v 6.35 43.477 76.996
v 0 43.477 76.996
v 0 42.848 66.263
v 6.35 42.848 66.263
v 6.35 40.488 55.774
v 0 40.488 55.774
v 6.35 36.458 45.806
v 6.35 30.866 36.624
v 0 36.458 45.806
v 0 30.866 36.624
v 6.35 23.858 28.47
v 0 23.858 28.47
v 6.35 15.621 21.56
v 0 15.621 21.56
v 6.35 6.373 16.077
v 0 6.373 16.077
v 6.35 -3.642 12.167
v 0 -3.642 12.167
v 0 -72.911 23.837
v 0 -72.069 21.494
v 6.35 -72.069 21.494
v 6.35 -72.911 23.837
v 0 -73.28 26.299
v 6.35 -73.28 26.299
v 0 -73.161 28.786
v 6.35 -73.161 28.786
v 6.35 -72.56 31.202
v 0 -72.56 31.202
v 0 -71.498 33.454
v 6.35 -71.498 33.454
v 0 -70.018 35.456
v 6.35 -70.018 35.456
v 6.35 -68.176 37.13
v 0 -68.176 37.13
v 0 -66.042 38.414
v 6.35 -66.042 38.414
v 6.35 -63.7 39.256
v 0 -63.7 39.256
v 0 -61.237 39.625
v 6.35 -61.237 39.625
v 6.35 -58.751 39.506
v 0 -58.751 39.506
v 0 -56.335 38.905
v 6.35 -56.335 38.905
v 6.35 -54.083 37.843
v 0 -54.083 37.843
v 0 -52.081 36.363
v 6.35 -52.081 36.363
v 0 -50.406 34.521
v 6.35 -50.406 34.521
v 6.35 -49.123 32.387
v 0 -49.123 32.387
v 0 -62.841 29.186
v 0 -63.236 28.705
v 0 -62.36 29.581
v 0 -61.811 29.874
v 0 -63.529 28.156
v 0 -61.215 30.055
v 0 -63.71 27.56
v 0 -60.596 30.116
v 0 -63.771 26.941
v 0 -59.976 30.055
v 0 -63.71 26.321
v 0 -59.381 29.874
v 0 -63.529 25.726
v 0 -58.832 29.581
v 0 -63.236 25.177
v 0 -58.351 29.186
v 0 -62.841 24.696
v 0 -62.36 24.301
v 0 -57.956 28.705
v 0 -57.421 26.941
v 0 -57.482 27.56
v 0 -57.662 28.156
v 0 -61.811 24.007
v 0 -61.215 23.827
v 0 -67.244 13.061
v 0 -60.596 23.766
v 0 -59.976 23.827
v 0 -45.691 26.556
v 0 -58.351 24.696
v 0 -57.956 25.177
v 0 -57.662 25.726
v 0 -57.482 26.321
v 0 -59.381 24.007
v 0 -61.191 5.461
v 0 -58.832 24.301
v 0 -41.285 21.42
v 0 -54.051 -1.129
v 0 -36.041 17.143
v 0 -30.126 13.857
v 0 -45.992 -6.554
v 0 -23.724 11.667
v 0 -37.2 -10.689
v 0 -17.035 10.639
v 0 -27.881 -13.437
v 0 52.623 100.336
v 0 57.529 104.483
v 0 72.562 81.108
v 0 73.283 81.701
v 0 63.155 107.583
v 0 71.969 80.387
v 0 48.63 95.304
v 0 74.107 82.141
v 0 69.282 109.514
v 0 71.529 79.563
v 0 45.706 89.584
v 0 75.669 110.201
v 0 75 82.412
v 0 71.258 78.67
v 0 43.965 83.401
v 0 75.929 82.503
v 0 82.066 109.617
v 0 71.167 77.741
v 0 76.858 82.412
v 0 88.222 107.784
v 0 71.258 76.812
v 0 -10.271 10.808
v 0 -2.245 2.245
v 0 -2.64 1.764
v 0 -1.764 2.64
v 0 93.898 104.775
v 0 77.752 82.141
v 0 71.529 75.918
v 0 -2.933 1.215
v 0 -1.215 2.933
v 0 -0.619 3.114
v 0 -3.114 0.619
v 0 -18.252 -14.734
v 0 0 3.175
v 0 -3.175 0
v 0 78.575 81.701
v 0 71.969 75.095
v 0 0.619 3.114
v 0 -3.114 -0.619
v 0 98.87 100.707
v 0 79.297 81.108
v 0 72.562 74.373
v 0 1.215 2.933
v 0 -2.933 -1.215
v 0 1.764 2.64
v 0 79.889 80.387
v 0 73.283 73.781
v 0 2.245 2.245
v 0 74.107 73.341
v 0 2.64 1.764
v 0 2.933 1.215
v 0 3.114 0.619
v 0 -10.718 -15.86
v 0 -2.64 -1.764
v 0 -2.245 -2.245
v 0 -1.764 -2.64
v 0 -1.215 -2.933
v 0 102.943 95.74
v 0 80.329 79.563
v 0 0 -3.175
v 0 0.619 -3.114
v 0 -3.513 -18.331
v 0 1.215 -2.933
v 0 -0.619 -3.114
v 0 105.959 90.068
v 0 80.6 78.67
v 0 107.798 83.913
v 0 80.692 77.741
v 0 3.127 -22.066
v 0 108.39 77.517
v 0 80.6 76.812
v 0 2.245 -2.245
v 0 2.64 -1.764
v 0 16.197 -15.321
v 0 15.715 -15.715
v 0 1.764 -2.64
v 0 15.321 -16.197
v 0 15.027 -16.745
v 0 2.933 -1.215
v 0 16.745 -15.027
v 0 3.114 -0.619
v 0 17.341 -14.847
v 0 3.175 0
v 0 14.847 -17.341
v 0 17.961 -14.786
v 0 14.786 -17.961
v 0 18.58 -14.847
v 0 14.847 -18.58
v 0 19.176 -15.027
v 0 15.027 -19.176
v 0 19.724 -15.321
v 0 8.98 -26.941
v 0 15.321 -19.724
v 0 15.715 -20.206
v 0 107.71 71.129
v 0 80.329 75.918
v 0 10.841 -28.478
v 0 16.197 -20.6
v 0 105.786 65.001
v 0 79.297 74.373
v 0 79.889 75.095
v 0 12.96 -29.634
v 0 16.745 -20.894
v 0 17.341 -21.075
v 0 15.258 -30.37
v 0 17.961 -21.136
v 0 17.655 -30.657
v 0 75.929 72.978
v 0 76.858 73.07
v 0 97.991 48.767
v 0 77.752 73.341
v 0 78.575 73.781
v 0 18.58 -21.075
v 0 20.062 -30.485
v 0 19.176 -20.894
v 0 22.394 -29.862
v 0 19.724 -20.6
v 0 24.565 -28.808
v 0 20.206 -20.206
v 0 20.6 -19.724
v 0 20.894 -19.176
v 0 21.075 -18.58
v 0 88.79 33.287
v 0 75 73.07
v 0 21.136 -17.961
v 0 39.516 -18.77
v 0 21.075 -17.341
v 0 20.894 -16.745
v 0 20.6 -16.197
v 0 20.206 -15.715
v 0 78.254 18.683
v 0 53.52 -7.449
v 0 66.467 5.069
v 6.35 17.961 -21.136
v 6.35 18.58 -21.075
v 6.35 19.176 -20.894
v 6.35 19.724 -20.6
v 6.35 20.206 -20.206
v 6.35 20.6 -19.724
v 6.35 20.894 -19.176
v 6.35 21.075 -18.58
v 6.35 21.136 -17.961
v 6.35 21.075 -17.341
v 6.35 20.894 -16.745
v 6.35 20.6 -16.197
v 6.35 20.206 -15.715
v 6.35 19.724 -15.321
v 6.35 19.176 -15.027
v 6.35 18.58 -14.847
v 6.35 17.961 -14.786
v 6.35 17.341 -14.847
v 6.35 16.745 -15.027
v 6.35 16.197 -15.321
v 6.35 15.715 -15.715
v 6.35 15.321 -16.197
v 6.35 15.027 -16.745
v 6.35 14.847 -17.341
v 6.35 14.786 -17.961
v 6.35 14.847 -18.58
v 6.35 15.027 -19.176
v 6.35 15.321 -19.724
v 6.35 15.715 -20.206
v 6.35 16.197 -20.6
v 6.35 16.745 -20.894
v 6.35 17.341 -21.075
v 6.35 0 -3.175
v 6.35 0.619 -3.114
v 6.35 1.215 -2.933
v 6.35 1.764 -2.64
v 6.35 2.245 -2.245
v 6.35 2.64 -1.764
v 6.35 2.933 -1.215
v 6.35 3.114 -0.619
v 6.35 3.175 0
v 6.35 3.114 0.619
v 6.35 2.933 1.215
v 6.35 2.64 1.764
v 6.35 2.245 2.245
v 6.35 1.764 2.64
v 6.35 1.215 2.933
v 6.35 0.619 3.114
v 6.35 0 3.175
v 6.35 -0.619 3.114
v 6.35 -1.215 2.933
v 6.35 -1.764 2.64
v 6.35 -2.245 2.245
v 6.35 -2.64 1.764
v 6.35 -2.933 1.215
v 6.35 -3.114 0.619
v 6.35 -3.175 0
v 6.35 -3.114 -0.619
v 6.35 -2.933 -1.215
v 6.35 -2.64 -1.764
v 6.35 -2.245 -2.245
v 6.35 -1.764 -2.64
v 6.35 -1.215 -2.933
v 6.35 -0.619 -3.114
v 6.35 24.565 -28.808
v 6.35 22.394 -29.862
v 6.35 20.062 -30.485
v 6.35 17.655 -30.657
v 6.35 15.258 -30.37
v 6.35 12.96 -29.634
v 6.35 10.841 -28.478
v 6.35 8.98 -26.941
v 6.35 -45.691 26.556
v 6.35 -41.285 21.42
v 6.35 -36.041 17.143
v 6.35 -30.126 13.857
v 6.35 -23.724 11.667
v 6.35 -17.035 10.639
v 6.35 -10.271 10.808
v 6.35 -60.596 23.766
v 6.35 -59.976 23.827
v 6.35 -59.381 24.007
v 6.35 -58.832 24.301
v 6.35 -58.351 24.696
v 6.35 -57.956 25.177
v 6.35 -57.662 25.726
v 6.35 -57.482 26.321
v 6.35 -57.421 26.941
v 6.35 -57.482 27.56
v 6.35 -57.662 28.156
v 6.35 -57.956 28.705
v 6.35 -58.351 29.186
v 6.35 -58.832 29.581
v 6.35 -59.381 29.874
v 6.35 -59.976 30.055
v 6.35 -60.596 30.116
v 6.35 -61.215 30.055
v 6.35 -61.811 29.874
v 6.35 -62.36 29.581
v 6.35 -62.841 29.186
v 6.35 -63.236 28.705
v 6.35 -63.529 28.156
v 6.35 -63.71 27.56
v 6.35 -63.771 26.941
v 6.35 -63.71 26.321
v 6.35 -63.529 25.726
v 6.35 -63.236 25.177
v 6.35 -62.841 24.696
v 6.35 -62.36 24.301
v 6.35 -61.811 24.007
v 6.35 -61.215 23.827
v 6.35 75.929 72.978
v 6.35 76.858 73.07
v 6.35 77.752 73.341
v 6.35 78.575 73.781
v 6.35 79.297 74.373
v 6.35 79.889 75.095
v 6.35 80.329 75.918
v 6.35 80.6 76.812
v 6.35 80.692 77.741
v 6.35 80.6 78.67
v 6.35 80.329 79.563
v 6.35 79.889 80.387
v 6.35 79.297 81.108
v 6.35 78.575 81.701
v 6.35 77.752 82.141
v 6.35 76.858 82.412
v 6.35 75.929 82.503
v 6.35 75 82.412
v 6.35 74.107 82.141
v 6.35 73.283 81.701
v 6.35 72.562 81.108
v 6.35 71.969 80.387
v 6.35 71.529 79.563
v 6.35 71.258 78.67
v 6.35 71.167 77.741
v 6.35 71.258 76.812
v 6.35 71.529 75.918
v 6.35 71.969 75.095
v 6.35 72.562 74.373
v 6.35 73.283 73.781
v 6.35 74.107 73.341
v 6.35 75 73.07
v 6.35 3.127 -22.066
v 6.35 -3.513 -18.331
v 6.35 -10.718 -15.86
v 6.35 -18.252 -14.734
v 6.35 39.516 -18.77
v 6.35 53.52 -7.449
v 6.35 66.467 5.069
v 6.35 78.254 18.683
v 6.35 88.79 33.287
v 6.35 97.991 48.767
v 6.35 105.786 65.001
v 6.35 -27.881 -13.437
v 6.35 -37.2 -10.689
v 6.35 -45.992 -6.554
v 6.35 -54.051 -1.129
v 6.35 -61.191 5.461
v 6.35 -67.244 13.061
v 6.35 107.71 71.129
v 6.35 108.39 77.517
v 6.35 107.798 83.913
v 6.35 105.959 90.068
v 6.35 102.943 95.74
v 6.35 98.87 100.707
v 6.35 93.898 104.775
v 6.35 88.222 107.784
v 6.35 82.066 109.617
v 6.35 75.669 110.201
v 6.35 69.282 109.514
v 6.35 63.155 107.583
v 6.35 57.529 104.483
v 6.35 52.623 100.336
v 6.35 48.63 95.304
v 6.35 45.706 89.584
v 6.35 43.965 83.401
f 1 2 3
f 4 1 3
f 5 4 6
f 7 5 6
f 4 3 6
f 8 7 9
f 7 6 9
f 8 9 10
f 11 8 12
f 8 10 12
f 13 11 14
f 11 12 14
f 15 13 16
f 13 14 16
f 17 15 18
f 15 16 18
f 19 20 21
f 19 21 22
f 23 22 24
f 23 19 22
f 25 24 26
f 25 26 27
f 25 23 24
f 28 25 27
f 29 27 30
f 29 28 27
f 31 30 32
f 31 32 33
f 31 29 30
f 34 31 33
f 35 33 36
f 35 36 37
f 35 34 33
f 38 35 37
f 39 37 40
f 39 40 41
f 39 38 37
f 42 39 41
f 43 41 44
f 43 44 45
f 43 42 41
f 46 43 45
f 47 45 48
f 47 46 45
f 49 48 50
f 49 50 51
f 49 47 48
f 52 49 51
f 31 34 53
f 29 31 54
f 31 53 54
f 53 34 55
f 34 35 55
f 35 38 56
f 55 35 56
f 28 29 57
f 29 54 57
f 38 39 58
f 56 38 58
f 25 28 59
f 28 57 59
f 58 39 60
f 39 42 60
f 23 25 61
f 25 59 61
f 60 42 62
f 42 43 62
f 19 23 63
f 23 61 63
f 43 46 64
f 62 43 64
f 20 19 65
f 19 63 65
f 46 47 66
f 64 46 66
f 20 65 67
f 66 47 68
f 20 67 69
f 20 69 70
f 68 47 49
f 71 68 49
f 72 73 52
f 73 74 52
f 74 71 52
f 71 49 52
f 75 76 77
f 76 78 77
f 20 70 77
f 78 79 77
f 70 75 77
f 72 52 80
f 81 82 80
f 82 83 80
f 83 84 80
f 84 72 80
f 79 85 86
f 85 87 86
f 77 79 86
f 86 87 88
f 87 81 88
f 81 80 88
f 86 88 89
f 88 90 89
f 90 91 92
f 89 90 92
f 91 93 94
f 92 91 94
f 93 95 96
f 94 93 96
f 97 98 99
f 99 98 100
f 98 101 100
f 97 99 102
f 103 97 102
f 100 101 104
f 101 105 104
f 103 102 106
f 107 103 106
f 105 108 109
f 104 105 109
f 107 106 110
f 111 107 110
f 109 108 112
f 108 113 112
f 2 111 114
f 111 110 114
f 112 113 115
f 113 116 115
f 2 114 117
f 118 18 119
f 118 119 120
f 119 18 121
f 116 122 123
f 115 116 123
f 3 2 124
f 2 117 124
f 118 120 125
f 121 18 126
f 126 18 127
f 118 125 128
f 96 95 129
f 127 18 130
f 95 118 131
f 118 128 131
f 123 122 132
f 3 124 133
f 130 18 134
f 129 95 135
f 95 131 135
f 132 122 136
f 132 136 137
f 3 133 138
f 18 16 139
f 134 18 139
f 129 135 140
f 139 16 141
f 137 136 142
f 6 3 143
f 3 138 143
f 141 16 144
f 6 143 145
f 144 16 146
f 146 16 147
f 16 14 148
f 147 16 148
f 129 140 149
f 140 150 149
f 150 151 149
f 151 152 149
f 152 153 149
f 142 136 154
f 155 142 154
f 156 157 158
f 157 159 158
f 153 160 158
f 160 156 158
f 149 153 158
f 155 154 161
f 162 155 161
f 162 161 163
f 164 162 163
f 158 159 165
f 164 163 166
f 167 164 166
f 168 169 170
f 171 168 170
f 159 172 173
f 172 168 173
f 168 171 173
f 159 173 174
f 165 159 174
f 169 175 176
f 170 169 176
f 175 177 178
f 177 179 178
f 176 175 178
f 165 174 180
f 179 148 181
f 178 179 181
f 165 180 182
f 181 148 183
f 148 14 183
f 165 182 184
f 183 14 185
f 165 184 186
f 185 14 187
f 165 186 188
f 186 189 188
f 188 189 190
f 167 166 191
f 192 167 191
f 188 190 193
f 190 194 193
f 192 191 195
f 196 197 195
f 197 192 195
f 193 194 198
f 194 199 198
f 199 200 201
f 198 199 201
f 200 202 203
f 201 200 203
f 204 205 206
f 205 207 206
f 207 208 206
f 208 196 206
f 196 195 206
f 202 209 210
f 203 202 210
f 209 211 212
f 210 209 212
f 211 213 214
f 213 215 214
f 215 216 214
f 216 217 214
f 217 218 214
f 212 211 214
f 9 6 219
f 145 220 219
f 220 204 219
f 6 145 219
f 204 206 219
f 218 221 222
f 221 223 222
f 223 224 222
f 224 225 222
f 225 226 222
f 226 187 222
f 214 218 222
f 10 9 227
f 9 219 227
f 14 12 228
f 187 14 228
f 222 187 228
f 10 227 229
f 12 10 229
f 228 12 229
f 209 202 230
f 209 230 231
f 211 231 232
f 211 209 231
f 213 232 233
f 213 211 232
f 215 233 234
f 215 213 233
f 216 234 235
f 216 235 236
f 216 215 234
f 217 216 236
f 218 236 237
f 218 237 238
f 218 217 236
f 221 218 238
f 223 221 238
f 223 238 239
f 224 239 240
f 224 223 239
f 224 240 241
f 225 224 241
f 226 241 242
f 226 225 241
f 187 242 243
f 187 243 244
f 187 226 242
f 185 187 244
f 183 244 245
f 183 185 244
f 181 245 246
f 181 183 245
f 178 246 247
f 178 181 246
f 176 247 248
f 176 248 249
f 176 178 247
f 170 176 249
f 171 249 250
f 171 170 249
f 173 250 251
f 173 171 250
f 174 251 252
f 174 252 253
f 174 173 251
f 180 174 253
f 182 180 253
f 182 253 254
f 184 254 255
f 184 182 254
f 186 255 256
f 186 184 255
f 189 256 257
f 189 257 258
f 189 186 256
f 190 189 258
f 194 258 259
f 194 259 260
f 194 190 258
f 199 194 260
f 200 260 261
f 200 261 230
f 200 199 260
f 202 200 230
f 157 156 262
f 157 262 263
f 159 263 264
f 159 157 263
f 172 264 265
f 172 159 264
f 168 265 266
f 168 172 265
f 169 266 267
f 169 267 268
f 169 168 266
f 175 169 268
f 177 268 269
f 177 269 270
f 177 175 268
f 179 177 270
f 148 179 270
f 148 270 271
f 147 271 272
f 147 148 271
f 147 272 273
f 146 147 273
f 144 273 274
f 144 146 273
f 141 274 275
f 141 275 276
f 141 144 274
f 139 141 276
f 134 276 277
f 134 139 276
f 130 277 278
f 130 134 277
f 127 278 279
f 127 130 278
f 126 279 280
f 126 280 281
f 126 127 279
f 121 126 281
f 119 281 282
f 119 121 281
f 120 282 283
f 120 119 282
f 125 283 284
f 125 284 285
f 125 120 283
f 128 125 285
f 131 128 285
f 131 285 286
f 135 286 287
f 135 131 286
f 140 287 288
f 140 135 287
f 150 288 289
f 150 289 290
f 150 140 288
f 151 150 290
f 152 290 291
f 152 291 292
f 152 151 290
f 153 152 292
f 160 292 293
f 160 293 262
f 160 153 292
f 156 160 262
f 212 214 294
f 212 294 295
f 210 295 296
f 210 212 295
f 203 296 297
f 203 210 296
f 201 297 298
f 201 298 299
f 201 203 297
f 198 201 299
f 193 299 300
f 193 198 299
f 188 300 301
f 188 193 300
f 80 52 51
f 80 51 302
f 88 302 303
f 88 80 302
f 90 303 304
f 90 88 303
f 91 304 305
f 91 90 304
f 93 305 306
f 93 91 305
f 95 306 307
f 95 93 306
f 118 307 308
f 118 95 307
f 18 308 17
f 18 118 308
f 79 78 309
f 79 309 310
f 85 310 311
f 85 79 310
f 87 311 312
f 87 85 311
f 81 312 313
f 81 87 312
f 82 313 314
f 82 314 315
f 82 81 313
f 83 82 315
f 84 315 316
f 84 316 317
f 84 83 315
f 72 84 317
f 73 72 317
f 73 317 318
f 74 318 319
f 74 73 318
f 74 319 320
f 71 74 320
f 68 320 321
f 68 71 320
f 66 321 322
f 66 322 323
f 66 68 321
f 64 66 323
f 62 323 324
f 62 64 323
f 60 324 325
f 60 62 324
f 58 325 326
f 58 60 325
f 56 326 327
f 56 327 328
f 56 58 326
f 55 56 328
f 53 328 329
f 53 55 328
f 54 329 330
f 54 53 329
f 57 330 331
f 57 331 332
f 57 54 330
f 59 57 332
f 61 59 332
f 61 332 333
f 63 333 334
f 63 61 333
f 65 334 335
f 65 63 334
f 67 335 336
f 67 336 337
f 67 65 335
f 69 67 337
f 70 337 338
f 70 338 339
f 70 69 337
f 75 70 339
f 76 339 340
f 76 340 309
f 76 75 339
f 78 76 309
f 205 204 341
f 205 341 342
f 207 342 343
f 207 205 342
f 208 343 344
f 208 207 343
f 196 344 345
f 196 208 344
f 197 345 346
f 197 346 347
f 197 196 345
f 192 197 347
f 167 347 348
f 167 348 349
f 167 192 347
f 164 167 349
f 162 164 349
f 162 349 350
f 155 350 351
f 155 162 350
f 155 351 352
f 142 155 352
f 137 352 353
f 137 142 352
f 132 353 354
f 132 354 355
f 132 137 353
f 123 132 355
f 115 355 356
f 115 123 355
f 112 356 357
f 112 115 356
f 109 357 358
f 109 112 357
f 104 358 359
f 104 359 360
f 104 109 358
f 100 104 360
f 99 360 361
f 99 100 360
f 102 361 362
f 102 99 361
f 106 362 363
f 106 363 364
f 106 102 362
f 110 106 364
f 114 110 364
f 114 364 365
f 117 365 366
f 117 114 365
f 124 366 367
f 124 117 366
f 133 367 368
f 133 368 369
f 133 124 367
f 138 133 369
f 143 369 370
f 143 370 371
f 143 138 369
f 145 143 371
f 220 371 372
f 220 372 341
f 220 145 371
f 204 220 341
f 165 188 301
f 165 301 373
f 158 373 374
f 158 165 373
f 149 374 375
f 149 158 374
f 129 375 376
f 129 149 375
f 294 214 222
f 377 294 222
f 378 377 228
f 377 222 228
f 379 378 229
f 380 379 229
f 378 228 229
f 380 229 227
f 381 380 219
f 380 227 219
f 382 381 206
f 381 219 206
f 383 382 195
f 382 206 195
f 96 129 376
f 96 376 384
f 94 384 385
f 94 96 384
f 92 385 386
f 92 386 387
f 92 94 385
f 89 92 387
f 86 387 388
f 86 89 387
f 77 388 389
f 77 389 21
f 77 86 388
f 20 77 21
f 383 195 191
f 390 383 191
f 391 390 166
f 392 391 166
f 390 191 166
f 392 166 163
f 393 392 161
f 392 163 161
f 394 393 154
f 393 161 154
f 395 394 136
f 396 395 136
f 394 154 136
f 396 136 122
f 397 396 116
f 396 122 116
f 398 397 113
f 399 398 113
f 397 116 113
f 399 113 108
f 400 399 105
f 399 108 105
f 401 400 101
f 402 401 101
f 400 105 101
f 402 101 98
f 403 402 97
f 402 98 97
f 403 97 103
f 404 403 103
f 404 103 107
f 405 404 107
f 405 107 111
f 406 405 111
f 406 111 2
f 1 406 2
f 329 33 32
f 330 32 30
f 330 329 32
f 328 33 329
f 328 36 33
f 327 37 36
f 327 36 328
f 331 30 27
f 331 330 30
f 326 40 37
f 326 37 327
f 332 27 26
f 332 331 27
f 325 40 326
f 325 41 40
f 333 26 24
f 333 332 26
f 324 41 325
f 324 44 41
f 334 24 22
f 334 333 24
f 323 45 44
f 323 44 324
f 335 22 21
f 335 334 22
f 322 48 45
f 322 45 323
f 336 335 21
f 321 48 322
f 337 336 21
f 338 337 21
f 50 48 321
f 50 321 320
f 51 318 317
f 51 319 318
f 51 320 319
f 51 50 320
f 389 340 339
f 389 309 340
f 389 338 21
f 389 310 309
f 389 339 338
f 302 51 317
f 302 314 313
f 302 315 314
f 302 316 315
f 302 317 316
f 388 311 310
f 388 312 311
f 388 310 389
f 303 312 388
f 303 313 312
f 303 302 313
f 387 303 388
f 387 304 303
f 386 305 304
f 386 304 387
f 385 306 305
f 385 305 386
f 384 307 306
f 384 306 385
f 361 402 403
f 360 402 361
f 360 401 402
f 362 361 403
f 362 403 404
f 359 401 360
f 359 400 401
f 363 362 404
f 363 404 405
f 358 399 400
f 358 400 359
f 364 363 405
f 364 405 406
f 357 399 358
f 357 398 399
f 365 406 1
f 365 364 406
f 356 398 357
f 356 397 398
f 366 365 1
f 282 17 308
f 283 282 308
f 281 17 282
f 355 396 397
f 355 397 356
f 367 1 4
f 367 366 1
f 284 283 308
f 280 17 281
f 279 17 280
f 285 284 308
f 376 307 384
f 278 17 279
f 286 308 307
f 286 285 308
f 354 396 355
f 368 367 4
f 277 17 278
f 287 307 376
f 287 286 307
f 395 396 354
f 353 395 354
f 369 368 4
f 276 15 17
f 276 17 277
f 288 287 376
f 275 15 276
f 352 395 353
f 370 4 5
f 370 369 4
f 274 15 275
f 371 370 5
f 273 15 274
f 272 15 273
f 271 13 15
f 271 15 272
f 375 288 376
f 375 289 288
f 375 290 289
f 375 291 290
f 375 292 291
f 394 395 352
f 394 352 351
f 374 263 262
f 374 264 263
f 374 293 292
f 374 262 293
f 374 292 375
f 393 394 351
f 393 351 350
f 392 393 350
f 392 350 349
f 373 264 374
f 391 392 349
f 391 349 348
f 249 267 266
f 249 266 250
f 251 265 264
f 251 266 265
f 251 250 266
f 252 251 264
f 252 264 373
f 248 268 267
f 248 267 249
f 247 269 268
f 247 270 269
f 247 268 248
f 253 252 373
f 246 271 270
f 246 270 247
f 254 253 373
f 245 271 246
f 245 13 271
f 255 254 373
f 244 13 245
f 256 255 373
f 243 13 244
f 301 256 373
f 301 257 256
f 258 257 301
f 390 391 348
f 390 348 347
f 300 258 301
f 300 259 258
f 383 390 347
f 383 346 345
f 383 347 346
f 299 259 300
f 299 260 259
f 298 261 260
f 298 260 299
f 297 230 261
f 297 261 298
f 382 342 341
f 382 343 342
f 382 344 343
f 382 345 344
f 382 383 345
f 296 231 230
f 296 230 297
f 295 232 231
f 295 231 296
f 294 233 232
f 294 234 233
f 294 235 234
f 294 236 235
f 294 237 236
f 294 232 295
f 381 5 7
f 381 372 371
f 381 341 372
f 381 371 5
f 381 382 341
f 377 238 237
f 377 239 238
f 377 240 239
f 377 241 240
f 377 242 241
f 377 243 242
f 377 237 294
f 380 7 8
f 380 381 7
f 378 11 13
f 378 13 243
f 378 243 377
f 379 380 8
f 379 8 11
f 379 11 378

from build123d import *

# Parameters (mm, degrees)
SKETCH1_R           = 3.175
BOSS_EXTRUDE1_DEPTH = 6.35
BOSS_EXTRUDE2_START = -6.35
SKETCH2_R           = 4.7625
BOSS_EXTRUDE2_DEPTH = 6.35


with BuildPart() as part:
    # Sketch1 → Boss-Extrude1 (new body)
    with BuildSketch(Plane(origin=(0, 0, 0), x_dir=(0, 0, -1), z_dir=(1, 0, 0))):
        with BuildLine():
            Line((-8.980256121, 8.980256121), (8.980256121, 26.940768363))
            ThreePointArc((8.980256121, 26.940768363), (26.940768363, 26.940768363), (26.940768363, 8.980256121))
            ThreePointArc((26.940768363, 8.980256121), (18.331397871, -3.512535502), (14.733533544, -18.2518189))
            ThreePointArc((14.733533544, -18.2518189), (3.99537448, -50.125222998), (-21.49411099, -72.068515352))
            ThreePointArc((-21.49411099, -72.068515352), (-38.413515352, -66.042425736), (-32.387425736, -49.123021375))
            ThreePointArc((-32.387425736, -49.123021375), (-13.857306444, -30.125859248), (-12.166610815, -3.641919999))
            ThreePointArc((-12.166610815, -3.641919999), (-12.313704877, 3.108483907), (-8.980256121, 8.980256121))
        make_face()
        Circle(SKETCH1_R, mode=Mode.SUBTRACT)
        with Locations((17.960512242, 17.960512242)):
            Circle(SKETCH1_R, mode=Mode.SUBTRACT)
        with Locations((-26.940768363, -60.595768363)):
            Circle(SKETCH1_R, mode=Mode.SUBTRACT)
    extrude(amount=BOSS_EXTRUDE1_DEPTH)

    # Sketch2 → Boss-Extrude2 (add)
    with BuildSketch(Plane(origin=(6.35, 0, 0), x_dir=(0, 0, -1), z_dir=(1, 0, 0)).offset(BOSS_EXTRUDE2_START)):
        with BuildLine():
            Line((-8.980256121, 8.980256121), (8.980256121, 26.940768363))
            ThreePointArc((8.980256121, 26.940768363), (19.47129419, 30.570331349), (28.80800074, 24.565207034))
            ThreePointArc((28.80800074, 24.565207034), (-11.744974479, 72.511118598), (-65.000542096, 105.785714805))
            ThreePointArc((-65.000542096, 105.785714805), (-109.616580791, 82.065642196), (-76.995649237, 43.476685512))
            ThreePointArc((-76.995649237, 43.476685512), (-36.623825936, 30.865592429), (-12.166610815, -3.641919999))
            ThreePointArc((-12.166610815, -3.641919999), (-12.313704877, 3.108483907), (-8.980256121, 8.980256121))
        make_face()
        with Locations((-77.740768363, 75.929231637)):
            Circle(SKETCH2_R, mode=Mode.SUBTRACT)
    extrude(amount=BOSS_EXTRUDE2_DEPTH)


solid = part.part
